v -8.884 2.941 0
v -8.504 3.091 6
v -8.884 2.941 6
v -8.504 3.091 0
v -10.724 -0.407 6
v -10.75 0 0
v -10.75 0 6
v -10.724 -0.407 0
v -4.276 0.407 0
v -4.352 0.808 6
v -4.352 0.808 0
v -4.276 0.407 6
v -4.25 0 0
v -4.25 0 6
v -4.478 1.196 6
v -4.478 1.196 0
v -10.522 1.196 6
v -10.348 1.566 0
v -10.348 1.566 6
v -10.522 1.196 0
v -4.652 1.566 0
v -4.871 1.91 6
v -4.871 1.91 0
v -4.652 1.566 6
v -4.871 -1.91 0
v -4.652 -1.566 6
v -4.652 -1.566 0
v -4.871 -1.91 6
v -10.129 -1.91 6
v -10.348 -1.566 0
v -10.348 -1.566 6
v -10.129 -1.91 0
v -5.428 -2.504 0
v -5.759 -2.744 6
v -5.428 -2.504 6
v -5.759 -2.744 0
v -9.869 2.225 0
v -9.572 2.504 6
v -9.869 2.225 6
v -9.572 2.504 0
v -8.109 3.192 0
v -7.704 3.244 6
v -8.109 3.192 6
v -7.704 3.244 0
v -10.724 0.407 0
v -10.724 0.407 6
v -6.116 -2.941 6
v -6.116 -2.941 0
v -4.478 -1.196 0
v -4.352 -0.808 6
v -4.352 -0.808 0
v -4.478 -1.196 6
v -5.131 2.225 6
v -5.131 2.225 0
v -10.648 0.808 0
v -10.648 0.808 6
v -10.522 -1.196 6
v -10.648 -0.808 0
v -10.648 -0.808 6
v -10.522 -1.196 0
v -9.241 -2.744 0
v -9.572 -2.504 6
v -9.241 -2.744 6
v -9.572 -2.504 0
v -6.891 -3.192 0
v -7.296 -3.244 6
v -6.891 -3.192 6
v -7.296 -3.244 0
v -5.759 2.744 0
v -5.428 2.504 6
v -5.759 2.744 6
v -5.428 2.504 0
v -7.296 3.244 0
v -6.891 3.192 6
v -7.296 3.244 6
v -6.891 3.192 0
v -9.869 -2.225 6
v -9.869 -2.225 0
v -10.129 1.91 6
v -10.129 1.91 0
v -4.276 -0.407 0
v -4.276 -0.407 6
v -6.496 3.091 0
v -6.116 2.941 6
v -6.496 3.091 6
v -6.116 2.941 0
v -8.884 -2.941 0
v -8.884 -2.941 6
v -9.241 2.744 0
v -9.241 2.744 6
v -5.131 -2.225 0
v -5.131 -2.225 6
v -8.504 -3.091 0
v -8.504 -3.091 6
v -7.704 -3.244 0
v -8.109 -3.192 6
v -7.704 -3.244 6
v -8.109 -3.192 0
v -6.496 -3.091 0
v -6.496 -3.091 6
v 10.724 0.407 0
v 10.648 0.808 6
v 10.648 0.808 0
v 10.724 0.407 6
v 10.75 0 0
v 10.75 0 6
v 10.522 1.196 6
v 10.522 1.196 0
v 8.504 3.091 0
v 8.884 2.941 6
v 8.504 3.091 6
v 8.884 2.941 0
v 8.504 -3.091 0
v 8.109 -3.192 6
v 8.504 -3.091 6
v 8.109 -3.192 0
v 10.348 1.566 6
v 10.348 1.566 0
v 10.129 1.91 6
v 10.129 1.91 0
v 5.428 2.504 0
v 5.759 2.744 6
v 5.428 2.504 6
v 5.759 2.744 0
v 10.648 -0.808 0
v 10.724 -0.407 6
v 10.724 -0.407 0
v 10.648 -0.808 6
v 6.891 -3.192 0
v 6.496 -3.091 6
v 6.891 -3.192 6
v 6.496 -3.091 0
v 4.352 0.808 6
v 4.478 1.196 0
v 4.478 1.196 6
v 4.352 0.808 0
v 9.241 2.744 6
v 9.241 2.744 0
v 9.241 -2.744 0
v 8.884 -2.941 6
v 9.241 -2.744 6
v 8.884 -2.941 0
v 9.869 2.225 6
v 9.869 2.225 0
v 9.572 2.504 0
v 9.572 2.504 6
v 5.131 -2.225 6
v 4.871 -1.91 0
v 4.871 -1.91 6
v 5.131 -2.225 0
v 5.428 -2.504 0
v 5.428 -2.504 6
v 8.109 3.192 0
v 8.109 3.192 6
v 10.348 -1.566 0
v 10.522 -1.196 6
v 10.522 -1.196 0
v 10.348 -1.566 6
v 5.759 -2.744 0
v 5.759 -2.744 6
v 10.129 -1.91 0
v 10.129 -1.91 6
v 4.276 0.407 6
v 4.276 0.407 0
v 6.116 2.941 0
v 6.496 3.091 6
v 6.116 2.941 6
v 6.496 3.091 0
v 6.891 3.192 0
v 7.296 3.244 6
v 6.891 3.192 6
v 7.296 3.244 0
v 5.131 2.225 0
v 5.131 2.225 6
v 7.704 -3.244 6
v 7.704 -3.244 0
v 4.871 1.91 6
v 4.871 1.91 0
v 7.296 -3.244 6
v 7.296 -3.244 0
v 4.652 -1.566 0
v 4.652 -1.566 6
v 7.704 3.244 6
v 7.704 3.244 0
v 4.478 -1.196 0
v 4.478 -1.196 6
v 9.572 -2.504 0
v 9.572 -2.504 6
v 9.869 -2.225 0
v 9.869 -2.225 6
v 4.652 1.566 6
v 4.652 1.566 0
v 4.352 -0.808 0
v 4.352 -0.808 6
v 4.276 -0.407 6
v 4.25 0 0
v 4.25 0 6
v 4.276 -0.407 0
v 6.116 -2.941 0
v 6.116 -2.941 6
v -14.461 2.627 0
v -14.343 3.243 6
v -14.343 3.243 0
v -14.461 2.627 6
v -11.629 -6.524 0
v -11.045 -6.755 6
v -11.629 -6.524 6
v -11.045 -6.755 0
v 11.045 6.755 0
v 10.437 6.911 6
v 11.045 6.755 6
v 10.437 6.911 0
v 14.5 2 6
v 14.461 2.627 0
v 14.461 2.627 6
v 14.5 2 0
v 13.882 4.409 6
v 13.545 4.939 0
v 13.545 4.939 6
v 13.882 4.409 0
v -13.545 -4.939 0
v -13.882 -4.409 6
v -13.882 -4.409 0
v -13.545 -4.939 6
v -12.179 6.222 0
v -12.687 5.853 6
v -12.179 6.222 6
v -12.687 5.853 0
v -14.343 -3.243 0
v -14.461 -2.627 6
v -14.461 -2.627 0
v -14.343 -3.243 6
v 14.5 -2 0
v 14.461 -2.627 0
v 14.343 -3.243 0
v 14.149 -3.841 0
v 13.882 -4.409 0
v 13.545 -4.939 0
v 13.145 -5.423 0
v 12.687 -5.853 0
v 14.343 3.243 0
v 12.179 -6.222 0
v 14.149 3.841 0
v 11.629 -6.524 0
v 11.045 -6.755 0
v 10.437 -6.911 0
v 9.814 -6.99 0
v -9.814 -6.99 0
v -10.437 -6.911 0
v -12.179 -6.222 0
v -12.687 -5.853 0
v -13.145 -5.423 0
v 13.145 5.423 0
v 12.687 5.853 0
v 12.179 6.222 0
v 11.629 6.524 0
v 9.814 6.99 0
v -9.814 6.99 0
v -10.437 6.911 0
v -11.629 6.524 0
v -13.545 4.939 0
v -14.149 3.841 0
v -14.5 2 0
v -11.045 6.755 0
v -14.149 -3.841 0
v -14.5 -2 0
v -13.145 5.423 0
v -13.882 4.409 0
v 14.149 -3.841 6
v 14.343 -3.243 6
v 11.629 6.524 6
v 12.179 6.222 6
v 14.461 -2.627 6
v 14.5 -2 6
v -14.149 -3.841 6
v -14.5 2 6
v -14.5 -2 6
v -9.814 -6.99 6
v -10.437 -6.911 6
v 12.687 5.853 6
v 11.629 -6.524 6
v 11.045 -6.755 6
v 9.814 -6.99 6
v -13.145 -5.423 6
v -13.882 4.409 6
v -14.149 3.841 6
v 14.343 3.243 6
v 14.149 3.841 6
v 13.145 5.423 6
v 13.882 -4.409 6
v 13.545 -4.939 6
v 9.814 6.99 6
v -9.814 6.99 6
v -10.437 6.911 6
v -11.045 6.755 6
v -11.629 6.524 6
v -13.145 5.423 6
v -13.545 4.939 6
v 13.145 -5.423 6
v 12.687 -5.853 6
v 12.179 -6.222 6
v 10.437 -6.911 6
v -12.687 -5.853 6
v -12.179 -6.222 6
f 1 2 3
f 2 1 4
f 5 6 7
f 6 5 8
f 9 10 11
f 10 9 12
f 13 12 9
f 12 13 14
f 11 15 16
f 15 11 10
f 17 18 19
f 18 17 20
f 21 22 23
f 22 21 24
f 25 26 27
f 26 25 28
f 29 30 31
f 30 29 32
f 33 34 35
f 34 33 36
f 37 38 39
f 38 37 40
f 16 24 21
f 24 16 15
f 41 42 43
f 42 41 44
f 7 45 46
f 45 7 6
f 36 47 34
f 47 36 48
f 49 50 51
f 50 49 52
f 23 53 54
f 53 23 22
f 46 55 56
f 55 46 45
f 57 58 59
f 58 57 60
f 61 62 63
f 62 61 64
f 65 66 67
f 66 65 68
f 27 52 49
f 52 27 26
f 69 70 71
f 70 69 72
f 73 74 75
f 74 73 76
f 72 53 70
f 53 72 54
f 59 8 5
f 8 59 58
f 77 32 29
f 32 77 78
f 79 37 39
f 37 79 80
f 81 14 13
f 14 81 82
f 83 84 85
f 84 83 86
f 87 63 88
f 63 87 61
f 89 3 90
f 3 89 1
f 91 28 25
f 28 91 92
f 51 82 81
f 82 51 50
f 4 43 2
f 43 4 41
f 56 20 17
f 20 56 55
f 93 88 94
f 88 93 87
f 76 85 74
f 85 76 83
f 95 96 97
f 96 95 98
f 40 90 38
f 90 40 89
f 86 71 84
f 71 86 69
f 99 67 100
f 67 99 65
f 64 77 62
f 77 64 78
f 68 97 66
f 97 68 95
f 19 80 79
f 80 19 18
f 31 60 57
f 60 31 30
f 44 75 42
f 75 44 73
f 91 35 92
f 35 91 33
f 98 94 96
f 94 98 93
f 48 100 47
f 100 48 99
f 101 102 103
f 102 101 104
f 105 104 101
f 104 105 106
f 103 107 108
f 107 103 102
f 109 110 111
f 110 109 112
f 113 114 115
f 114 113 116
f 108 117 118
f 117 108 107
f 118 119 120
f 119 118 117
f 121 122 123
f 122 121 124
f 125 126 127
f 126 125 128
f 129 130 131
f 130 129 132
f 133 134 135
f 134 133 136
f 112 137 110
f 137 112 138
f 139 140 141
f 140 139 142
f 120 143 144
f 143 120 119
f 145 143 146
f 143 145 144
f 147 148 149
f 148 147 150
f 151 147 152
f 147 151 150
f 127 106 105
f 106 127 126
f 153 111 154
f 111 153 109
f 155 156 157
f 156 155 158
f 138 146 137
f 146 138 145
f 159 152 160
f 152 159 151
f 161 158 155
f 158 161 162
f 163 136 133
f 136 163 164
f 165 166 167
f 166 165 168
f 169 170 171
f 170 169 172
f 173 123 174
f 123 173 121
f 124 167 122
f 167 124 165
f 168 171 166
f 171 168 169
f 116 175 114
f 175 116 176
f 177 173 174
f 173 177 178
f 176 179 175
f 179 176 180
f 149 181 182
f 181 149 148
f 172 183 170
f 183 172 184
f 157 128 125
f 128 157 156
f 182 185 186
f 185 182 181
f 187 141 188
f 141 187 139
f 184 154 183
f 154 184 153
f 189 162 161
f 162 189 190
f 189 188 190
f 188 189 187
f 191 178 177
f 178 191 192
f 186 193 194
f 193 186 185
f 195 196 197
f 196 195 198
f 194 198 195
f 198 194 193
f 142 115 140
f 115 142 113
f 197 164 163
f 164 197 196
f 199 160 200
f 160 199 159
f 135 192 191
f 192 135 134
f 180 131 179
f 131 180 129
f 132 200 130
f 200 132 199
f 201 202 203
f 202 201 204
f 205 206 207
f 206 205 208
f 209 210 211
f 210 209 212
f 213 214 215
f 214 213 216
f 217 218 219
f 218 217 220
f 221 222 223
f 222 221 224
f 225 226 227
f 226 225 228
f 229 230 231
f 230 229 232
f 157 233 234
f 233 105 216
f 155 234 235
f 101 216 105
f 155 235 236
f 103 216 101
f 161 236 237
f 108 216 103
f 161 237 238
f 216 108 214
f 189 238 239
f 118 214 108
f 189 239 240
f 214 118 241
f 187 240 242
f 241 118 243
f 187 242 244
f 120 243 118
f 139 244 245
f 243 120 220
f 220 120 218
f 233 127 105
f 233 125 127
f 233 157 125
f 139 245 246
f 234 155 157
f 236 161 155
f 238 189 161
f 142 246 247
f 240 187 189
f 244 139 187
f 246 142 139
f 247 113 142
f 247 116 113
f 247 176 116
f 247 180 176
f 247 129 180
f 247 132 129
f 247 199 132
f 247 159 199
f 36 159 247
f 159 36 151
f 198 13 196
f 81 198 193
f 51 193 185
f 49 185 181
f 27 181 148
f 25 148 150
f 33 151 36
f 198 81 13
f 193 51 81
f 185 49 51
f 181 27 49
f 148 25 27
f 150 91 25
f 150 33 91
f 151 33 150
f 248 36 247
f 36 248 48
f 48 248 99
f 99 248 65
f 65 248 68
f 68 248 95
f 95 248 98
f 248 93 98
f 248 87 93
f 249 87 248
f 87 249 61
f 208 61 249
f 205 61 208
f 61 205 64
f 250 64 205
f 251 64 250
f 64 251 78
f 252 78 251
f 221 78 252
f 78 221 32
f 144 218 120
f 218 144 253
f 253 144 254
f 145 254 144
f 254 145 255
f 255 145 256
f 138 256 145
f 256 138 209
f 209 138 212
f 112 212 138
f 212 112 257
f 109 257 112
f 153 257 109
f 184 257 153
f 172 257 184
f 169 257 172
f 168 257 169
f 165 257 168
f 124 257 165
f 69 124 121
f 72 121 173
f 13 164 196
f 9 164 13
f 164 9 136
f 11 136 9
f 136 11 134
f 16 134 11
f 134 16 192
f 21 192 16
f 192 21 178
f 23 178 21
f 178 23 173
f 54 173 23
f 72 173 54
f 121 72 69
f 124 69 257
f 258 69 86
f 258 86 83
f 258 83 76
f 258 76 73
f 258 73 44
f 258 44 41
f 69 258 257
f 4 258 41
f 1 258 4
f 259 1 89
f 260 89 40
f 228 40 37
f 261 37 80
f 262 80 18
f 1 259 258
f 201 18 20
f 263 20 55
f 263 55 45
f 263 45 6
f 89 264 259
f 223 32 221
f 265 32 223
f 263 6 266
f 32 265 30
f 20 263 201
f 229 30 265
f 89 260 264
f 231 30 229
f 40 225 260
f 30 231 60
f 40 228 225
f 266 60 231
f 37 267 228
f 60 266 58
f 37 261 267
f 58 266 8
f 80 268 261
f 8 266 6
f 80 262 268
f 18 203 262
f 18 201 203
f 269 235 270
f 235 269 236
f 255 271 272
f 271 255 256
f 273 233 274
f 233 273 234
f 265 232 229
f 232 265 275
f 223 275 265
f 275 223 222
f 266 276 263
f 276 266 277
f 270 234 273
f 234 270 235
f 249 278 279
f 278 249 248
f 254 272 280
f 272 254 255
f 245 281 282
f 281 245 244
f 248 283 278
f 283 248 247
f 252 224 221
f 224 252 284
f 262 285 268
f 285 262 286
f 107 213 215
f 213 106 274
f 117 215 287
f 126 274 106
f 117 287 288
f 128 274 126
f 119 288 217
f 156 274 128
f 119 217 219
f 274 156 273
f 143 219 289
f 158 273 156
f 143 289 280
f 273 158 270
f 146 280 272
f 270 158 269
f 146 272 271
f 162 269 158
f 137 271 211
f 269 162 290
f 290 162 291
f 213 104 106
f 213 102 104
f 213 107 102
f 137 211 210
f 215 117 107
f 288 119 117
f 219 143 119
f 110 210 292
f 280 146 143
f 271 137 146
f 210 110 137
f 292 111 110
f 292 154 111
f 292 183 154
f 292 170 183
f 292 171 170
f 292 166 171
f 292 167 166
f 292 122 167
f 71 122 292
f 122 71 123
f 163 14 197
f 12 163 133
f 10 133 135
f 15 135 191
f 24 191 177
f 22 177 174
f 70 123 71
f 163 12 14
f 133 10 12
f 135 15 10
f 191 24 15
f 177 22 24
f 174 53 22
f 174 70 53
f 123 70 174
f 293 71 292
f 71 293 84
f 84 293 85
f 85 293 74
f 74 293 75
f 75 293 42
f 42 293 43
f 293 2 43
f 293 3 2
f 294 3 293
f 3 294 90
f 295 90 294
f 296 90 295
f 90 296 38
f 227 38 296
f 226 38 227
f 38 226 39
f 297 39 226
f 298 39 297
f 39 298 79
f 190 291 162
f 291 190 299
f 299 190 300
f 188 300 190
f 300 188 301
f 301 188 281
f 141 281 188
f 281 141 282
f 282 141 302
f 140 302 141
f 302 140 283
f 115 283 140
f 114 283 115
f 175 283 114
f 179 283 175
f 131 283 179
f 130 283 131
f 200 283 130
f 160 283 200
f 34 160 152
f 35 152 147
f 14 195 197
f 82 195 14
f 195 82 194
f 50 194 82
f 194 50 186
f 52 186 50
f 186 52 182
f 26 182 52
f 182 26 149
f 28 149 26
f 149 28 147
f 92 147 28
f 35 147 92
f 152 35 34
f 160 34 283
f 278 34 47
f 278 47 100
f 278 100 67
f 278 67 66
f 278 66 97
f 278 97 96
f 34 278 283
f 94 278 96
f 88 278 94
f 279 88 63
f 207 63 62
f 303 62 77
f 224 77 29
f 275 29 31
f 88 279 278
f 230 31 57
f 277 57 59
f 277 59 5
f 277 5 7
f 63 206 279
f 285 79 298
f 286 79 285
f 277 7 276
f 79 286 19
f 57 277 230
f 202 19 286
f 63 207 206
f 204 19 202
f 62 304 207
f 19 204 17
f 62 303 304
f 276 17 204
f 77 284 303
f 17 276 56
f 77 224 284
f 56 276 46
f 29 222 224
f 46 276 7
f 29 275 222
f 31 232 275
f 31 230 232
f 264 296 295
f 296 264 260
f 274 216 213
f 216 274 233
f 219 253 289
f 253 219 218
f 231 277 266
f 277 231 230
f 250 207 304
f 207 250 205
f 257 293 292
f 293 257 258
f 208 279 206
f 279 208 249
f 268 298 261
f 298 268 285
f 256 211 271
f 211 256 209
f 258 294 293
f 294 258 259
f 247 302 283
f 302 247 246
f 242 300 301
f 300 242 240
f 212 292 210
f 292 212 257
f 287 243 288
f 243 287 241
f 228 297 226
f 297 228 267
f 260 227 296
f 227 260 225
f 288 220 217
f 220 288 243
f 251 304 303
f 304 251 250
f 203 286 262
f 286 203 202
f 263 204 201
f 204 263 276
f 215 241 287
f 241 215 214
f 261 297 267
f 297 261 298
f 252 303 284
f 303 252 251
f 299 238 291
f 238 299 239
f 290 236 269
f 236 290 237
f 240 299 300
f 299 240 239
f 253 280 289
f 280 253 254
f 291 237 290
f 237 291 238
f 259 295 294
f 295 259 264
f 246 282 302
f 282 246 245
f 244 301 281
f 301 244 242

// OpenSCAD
$fn = 50;


difference() {
	union() {
		hull() {
			translate(v = [-9.5000000000, 2.0000000000, 0]) {
				cylinder(h = 6, r = 5);
			}
			translate(v = [9.5000000000, 2.0000000000, 0]) {
				cylinder(h = 6, r = 5);
			}
			translate(v = [-9.5000000000, -2.0000000000, 0]) {
				cylinder(h = 6, r = 5);
			}
			translate(v = [9.5000000000, -2.0000000000, 0]) {
				cylinder(h = 6, r = 5);
			}
		}
	}
	union() {
		translate(v = [-7.5000000000, 0.0000000000, -100.0000000000]) {
			cylinder(h = 200, r = 3.2500000000);
		}
		translate(v = [7.5000000000, 0.0000000000, -100.0000000000]) {
			cylinder(h = 200, r = 3.2500000000);
		}
	}
}
